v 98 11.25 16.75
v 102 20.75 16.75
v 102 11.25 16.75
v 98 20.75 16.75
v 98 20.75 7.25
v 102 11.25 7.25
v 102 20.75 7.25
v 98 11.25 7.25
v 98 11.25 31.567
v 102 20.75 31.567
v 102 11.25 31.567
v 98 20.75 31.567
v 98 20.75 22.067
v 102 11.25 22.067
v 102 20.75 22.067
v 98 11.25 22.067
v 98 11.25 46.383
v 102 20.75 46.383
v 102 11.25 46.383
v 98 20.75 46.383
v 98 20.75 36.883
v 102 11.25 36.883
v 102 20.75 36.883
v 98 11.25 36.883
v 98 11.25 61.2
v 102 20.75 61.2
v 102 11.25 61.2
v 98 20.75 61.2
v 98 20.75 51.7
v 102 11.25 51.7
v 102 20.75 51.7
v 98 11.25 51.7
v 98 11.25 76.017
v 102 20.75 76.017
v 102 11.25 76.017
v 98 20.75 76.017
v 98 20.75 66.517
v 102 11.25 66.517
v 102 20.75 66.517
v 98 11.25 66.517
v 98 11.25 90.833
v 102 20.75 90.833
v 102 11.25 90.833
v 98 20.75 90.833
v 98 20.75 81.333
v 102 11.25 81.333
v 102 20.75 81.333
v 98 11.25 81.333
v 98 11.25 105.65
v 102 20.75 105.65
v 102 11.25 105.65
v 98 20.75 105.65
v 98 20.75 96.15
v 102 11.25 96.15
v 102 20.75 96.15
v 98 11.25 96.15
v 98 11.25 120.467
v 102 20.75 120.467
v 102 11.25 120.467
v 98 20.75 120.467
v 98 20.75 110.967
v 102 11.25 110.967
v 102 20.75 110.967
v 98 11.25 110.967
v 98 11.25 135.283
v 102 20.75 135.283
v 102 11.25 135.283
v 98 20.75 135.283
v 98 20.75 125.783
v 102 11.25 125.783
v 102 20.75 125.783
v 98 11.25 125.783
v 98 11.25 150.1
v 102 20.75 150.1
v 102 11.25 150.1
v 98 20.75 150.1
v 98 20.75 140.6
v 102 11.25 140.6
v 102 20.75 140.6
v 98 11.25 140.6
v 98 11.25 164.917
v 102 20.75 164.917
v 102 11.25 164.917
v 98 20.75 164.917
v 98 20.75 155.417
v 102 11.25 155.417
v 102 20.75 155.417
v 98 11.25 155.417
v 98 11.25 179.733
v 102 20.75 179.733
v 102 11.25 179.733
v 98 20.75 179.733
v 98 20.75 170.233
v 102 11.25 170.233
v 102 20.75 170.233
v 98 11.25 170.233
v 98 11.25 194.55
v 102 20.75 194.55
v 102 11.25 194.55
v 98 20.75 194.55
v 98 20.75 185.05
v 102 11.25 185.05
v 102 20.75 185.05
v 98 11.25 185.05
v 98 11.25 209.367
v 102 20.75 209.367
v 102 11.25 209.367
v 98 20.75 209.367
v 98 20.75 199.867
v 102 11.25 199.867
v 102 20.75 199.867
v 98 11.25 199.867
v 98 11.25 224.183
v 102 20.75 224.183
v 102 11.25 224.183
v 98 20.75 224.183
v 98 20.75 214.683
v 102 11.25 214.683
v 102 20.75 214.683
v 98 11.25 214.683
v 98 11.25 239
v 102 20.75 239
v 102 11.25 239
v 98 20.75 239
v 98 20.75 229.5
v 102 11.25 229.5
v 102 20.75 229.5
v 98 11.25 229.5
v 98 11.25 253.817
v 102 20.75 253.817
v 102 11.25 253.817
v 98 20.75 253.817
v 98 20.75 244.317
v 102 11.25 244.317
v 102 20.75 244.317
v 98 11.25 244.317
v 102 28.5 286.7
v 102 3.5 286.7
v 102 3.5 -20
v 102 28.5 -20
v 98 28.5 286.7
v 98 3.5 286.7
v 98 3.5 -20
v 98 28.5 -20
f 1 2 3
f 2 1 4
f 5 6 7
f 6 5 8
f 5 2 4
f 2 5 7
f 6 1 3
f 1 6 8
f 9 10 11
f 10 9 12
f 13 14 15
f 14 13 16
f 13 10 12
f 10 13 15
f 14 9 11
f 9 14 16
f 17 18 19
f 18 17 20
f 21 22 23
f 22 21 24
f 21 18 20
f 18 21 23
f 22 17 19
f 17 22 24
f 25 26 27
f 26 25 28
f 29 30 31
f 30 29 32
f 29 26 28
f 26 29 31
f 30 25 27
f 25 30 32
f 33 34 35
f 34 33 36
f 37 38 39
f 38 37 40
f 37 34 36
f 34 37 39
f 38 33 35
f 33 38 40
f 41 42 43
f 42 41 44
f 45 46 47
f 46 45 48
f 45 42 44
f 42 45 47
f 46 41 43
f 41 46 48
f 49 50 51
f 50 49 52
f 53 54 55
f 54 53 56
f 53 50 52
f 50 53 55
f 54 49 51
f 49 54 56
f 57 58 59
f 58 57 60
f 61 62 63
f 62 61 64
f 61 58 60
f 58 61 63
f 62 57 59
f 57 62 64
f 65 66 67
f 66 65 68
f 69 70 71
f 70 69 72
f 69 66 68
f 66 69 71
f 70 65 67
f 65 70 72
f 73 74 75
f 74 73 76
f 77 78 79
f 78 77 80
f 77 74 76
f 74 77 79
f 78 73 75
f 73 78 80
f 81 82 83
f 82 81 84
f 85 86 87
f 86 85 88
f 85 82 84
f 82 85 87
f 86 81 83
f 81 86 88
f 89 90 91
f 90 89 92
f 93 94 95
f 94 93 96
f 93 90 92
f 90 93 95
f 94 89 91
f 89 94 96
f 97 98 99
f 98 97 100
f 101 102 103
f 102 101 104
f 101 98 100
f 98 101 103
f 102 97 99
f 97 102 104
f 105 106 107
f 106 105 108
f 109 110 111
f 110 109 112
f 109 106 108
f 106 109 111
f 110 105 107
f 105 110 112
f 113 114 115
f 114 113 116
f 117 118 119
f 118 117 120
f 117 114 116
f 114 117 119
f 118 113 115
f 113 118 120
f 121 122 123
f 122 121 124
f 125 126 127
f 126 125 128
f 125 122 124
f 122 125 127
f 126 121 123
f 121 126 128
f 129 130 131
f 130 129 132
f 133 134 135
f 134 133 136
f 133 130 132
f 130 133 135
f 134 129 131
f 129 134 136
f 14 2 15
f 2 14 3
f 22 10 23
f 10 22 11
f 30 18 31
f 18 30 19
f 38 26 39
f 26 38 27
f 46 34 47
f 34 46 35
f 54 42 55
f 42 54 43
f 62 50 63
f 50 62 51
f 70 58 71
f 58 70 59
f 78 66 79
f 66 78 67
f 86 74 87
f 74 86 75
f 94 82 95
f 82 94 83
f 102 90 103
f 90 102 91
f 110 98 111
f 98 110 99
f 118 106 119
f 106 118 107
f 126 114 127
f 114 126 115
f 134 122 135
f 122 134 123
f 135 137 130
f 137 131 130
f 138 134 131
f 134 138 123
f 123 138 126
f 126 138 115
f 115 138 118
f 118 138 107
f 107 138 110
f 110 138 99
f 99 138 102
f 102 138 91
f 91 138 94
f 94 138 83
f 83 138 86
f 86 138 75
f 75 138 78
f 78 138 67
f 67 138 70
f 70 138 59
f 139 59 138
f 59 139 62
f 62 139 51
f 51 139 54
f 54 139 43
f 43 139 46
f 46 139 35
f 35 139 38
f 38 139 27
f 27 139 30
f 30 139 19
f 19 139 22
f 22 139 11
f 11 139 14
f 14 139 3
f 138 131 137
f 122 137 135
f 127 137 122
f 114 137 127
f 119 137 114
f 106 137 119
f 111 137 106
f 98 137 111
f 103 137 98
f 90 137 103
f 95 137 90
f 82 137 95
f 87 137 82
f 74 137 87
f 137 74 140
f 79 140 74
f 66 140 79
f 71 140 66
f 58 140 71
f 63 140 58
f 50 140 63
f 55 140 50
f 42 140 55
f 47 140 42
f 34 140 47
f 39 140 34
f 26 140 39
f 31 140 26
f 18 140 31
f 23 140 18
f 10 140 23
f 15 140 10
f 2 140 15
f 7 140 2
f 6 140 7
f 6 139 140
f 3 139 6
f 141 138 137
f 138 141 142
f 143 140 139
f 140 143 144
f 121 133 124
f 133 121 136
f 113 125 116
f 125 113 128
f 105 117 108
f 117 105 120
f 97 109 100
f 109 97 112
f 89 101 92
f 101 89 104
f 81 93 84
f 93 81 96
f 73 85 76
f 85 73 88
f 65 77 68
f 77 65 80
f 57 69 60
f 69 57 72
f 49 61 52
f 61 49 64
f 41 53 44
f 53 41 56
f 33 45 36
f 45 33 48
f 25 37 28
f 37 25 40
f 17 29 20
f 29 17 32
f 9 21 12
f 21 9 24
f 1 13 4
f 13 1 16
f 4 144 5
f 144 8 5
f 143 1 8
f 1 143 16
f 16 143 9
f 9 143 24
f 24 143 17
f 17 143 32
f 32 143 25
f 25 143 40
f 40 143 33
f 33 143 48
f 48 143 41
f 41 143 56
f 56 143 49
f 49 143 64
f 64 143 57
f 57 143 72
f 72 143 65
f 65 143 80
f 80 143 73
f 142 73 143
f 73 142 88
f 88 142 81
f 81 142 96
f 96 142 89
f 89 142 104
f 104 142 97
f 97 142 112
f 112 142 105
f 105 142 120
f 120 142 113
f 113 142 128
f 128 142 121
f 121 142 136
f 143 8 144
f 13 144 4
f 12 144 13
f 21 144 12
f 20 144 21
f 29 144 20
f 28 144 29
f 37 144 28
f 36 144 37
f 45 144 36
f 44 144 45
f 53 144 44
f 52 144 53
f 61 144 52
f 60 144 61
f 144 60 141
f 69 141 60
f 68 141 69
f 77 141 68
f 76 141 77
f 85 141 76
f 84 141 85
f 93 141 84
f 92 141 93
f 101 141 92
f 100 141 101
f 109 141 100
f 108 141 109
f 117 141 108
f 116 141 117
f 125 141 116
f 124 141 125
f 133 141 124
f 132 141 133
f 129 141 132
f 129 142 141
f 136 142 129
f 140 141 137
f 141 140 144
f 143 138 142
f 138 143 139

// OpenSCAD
// file: config.scad
// ============================================================
//  config.scad — shared dimensions (single source of truth)
//  Every other file includes this. Change a number here and
//  the part files AND the assembly update together.
//  Units: mm.  Z is up.
// ============================================================

/* ----- rack ----- */
U       = 44.45;
span_U  = 6;
span    = span_U * U;        // 266.7 — spine length / mount span
post_t  = 4;
post_w  = 25;

/* ----- fan ----- */
fan_size  = 120;
fan_thick = 25;
fan_pitch = 105;
fan_hole_d = 4.5;            // M4 clearance (anti-vibration washers under the head)
bore_d    = 112;

/* ----- carrier ----- */
thickness       = 6;         // one thickness -> flat part (print or waterjet/CNC)
frame_corner_r  = 4;
gap_to_spine    = 6;
mount_bolt_d    = 5.5;       // M5 clearance into T-nuts
mount_bolt_span = 90;
slot_travel     = 6;
flange_height   = 100;

/* ----- spine (2020) ----- */
ext_width  = 20;

/* ----- fan heights along the rail ----- */
fan1_z = fan_size/2 + 5;
fan2_z = span - fan_size/2 - 5;

/* ----- derived placement (shared by carrier + spine + bracket) ----- */
spine_face_x   = fan_size/2 + gap_to_spine;   // 66
spine_center_x = spine_face_x + ext_width/2;  // 76
wing_x0        = fan_size/2 - 4;              // 56
wing_x1        = spine_face_x + ext_width;    // 86
post_x         = wing_x1 + 12;                // 98 (post inner face)

$fn = 64;
eps = 0.01;
// main file
// ============================================================
//  rack_post.scad — rack post (context only, not fabricated)
//  Shows the EIA cage-nut holes so you can see how it mounts.
// ============================================================
include <config.scad>

module rack_post() {
    color("DimGray")
    difference() {
        translate([post_x, thickness + ext_width/2 - post_w/2, -20])
            cube([post_t, post_w, span + 40]);
        for (z = [12 : U/3 : span - 8])
            translate([post_x - eps, thickness + ext_width/2 - 4.75, z - 4.75])
                cube([post_t + 2*eps, 9.5, 9.5]);
    }
}

rack_post();
